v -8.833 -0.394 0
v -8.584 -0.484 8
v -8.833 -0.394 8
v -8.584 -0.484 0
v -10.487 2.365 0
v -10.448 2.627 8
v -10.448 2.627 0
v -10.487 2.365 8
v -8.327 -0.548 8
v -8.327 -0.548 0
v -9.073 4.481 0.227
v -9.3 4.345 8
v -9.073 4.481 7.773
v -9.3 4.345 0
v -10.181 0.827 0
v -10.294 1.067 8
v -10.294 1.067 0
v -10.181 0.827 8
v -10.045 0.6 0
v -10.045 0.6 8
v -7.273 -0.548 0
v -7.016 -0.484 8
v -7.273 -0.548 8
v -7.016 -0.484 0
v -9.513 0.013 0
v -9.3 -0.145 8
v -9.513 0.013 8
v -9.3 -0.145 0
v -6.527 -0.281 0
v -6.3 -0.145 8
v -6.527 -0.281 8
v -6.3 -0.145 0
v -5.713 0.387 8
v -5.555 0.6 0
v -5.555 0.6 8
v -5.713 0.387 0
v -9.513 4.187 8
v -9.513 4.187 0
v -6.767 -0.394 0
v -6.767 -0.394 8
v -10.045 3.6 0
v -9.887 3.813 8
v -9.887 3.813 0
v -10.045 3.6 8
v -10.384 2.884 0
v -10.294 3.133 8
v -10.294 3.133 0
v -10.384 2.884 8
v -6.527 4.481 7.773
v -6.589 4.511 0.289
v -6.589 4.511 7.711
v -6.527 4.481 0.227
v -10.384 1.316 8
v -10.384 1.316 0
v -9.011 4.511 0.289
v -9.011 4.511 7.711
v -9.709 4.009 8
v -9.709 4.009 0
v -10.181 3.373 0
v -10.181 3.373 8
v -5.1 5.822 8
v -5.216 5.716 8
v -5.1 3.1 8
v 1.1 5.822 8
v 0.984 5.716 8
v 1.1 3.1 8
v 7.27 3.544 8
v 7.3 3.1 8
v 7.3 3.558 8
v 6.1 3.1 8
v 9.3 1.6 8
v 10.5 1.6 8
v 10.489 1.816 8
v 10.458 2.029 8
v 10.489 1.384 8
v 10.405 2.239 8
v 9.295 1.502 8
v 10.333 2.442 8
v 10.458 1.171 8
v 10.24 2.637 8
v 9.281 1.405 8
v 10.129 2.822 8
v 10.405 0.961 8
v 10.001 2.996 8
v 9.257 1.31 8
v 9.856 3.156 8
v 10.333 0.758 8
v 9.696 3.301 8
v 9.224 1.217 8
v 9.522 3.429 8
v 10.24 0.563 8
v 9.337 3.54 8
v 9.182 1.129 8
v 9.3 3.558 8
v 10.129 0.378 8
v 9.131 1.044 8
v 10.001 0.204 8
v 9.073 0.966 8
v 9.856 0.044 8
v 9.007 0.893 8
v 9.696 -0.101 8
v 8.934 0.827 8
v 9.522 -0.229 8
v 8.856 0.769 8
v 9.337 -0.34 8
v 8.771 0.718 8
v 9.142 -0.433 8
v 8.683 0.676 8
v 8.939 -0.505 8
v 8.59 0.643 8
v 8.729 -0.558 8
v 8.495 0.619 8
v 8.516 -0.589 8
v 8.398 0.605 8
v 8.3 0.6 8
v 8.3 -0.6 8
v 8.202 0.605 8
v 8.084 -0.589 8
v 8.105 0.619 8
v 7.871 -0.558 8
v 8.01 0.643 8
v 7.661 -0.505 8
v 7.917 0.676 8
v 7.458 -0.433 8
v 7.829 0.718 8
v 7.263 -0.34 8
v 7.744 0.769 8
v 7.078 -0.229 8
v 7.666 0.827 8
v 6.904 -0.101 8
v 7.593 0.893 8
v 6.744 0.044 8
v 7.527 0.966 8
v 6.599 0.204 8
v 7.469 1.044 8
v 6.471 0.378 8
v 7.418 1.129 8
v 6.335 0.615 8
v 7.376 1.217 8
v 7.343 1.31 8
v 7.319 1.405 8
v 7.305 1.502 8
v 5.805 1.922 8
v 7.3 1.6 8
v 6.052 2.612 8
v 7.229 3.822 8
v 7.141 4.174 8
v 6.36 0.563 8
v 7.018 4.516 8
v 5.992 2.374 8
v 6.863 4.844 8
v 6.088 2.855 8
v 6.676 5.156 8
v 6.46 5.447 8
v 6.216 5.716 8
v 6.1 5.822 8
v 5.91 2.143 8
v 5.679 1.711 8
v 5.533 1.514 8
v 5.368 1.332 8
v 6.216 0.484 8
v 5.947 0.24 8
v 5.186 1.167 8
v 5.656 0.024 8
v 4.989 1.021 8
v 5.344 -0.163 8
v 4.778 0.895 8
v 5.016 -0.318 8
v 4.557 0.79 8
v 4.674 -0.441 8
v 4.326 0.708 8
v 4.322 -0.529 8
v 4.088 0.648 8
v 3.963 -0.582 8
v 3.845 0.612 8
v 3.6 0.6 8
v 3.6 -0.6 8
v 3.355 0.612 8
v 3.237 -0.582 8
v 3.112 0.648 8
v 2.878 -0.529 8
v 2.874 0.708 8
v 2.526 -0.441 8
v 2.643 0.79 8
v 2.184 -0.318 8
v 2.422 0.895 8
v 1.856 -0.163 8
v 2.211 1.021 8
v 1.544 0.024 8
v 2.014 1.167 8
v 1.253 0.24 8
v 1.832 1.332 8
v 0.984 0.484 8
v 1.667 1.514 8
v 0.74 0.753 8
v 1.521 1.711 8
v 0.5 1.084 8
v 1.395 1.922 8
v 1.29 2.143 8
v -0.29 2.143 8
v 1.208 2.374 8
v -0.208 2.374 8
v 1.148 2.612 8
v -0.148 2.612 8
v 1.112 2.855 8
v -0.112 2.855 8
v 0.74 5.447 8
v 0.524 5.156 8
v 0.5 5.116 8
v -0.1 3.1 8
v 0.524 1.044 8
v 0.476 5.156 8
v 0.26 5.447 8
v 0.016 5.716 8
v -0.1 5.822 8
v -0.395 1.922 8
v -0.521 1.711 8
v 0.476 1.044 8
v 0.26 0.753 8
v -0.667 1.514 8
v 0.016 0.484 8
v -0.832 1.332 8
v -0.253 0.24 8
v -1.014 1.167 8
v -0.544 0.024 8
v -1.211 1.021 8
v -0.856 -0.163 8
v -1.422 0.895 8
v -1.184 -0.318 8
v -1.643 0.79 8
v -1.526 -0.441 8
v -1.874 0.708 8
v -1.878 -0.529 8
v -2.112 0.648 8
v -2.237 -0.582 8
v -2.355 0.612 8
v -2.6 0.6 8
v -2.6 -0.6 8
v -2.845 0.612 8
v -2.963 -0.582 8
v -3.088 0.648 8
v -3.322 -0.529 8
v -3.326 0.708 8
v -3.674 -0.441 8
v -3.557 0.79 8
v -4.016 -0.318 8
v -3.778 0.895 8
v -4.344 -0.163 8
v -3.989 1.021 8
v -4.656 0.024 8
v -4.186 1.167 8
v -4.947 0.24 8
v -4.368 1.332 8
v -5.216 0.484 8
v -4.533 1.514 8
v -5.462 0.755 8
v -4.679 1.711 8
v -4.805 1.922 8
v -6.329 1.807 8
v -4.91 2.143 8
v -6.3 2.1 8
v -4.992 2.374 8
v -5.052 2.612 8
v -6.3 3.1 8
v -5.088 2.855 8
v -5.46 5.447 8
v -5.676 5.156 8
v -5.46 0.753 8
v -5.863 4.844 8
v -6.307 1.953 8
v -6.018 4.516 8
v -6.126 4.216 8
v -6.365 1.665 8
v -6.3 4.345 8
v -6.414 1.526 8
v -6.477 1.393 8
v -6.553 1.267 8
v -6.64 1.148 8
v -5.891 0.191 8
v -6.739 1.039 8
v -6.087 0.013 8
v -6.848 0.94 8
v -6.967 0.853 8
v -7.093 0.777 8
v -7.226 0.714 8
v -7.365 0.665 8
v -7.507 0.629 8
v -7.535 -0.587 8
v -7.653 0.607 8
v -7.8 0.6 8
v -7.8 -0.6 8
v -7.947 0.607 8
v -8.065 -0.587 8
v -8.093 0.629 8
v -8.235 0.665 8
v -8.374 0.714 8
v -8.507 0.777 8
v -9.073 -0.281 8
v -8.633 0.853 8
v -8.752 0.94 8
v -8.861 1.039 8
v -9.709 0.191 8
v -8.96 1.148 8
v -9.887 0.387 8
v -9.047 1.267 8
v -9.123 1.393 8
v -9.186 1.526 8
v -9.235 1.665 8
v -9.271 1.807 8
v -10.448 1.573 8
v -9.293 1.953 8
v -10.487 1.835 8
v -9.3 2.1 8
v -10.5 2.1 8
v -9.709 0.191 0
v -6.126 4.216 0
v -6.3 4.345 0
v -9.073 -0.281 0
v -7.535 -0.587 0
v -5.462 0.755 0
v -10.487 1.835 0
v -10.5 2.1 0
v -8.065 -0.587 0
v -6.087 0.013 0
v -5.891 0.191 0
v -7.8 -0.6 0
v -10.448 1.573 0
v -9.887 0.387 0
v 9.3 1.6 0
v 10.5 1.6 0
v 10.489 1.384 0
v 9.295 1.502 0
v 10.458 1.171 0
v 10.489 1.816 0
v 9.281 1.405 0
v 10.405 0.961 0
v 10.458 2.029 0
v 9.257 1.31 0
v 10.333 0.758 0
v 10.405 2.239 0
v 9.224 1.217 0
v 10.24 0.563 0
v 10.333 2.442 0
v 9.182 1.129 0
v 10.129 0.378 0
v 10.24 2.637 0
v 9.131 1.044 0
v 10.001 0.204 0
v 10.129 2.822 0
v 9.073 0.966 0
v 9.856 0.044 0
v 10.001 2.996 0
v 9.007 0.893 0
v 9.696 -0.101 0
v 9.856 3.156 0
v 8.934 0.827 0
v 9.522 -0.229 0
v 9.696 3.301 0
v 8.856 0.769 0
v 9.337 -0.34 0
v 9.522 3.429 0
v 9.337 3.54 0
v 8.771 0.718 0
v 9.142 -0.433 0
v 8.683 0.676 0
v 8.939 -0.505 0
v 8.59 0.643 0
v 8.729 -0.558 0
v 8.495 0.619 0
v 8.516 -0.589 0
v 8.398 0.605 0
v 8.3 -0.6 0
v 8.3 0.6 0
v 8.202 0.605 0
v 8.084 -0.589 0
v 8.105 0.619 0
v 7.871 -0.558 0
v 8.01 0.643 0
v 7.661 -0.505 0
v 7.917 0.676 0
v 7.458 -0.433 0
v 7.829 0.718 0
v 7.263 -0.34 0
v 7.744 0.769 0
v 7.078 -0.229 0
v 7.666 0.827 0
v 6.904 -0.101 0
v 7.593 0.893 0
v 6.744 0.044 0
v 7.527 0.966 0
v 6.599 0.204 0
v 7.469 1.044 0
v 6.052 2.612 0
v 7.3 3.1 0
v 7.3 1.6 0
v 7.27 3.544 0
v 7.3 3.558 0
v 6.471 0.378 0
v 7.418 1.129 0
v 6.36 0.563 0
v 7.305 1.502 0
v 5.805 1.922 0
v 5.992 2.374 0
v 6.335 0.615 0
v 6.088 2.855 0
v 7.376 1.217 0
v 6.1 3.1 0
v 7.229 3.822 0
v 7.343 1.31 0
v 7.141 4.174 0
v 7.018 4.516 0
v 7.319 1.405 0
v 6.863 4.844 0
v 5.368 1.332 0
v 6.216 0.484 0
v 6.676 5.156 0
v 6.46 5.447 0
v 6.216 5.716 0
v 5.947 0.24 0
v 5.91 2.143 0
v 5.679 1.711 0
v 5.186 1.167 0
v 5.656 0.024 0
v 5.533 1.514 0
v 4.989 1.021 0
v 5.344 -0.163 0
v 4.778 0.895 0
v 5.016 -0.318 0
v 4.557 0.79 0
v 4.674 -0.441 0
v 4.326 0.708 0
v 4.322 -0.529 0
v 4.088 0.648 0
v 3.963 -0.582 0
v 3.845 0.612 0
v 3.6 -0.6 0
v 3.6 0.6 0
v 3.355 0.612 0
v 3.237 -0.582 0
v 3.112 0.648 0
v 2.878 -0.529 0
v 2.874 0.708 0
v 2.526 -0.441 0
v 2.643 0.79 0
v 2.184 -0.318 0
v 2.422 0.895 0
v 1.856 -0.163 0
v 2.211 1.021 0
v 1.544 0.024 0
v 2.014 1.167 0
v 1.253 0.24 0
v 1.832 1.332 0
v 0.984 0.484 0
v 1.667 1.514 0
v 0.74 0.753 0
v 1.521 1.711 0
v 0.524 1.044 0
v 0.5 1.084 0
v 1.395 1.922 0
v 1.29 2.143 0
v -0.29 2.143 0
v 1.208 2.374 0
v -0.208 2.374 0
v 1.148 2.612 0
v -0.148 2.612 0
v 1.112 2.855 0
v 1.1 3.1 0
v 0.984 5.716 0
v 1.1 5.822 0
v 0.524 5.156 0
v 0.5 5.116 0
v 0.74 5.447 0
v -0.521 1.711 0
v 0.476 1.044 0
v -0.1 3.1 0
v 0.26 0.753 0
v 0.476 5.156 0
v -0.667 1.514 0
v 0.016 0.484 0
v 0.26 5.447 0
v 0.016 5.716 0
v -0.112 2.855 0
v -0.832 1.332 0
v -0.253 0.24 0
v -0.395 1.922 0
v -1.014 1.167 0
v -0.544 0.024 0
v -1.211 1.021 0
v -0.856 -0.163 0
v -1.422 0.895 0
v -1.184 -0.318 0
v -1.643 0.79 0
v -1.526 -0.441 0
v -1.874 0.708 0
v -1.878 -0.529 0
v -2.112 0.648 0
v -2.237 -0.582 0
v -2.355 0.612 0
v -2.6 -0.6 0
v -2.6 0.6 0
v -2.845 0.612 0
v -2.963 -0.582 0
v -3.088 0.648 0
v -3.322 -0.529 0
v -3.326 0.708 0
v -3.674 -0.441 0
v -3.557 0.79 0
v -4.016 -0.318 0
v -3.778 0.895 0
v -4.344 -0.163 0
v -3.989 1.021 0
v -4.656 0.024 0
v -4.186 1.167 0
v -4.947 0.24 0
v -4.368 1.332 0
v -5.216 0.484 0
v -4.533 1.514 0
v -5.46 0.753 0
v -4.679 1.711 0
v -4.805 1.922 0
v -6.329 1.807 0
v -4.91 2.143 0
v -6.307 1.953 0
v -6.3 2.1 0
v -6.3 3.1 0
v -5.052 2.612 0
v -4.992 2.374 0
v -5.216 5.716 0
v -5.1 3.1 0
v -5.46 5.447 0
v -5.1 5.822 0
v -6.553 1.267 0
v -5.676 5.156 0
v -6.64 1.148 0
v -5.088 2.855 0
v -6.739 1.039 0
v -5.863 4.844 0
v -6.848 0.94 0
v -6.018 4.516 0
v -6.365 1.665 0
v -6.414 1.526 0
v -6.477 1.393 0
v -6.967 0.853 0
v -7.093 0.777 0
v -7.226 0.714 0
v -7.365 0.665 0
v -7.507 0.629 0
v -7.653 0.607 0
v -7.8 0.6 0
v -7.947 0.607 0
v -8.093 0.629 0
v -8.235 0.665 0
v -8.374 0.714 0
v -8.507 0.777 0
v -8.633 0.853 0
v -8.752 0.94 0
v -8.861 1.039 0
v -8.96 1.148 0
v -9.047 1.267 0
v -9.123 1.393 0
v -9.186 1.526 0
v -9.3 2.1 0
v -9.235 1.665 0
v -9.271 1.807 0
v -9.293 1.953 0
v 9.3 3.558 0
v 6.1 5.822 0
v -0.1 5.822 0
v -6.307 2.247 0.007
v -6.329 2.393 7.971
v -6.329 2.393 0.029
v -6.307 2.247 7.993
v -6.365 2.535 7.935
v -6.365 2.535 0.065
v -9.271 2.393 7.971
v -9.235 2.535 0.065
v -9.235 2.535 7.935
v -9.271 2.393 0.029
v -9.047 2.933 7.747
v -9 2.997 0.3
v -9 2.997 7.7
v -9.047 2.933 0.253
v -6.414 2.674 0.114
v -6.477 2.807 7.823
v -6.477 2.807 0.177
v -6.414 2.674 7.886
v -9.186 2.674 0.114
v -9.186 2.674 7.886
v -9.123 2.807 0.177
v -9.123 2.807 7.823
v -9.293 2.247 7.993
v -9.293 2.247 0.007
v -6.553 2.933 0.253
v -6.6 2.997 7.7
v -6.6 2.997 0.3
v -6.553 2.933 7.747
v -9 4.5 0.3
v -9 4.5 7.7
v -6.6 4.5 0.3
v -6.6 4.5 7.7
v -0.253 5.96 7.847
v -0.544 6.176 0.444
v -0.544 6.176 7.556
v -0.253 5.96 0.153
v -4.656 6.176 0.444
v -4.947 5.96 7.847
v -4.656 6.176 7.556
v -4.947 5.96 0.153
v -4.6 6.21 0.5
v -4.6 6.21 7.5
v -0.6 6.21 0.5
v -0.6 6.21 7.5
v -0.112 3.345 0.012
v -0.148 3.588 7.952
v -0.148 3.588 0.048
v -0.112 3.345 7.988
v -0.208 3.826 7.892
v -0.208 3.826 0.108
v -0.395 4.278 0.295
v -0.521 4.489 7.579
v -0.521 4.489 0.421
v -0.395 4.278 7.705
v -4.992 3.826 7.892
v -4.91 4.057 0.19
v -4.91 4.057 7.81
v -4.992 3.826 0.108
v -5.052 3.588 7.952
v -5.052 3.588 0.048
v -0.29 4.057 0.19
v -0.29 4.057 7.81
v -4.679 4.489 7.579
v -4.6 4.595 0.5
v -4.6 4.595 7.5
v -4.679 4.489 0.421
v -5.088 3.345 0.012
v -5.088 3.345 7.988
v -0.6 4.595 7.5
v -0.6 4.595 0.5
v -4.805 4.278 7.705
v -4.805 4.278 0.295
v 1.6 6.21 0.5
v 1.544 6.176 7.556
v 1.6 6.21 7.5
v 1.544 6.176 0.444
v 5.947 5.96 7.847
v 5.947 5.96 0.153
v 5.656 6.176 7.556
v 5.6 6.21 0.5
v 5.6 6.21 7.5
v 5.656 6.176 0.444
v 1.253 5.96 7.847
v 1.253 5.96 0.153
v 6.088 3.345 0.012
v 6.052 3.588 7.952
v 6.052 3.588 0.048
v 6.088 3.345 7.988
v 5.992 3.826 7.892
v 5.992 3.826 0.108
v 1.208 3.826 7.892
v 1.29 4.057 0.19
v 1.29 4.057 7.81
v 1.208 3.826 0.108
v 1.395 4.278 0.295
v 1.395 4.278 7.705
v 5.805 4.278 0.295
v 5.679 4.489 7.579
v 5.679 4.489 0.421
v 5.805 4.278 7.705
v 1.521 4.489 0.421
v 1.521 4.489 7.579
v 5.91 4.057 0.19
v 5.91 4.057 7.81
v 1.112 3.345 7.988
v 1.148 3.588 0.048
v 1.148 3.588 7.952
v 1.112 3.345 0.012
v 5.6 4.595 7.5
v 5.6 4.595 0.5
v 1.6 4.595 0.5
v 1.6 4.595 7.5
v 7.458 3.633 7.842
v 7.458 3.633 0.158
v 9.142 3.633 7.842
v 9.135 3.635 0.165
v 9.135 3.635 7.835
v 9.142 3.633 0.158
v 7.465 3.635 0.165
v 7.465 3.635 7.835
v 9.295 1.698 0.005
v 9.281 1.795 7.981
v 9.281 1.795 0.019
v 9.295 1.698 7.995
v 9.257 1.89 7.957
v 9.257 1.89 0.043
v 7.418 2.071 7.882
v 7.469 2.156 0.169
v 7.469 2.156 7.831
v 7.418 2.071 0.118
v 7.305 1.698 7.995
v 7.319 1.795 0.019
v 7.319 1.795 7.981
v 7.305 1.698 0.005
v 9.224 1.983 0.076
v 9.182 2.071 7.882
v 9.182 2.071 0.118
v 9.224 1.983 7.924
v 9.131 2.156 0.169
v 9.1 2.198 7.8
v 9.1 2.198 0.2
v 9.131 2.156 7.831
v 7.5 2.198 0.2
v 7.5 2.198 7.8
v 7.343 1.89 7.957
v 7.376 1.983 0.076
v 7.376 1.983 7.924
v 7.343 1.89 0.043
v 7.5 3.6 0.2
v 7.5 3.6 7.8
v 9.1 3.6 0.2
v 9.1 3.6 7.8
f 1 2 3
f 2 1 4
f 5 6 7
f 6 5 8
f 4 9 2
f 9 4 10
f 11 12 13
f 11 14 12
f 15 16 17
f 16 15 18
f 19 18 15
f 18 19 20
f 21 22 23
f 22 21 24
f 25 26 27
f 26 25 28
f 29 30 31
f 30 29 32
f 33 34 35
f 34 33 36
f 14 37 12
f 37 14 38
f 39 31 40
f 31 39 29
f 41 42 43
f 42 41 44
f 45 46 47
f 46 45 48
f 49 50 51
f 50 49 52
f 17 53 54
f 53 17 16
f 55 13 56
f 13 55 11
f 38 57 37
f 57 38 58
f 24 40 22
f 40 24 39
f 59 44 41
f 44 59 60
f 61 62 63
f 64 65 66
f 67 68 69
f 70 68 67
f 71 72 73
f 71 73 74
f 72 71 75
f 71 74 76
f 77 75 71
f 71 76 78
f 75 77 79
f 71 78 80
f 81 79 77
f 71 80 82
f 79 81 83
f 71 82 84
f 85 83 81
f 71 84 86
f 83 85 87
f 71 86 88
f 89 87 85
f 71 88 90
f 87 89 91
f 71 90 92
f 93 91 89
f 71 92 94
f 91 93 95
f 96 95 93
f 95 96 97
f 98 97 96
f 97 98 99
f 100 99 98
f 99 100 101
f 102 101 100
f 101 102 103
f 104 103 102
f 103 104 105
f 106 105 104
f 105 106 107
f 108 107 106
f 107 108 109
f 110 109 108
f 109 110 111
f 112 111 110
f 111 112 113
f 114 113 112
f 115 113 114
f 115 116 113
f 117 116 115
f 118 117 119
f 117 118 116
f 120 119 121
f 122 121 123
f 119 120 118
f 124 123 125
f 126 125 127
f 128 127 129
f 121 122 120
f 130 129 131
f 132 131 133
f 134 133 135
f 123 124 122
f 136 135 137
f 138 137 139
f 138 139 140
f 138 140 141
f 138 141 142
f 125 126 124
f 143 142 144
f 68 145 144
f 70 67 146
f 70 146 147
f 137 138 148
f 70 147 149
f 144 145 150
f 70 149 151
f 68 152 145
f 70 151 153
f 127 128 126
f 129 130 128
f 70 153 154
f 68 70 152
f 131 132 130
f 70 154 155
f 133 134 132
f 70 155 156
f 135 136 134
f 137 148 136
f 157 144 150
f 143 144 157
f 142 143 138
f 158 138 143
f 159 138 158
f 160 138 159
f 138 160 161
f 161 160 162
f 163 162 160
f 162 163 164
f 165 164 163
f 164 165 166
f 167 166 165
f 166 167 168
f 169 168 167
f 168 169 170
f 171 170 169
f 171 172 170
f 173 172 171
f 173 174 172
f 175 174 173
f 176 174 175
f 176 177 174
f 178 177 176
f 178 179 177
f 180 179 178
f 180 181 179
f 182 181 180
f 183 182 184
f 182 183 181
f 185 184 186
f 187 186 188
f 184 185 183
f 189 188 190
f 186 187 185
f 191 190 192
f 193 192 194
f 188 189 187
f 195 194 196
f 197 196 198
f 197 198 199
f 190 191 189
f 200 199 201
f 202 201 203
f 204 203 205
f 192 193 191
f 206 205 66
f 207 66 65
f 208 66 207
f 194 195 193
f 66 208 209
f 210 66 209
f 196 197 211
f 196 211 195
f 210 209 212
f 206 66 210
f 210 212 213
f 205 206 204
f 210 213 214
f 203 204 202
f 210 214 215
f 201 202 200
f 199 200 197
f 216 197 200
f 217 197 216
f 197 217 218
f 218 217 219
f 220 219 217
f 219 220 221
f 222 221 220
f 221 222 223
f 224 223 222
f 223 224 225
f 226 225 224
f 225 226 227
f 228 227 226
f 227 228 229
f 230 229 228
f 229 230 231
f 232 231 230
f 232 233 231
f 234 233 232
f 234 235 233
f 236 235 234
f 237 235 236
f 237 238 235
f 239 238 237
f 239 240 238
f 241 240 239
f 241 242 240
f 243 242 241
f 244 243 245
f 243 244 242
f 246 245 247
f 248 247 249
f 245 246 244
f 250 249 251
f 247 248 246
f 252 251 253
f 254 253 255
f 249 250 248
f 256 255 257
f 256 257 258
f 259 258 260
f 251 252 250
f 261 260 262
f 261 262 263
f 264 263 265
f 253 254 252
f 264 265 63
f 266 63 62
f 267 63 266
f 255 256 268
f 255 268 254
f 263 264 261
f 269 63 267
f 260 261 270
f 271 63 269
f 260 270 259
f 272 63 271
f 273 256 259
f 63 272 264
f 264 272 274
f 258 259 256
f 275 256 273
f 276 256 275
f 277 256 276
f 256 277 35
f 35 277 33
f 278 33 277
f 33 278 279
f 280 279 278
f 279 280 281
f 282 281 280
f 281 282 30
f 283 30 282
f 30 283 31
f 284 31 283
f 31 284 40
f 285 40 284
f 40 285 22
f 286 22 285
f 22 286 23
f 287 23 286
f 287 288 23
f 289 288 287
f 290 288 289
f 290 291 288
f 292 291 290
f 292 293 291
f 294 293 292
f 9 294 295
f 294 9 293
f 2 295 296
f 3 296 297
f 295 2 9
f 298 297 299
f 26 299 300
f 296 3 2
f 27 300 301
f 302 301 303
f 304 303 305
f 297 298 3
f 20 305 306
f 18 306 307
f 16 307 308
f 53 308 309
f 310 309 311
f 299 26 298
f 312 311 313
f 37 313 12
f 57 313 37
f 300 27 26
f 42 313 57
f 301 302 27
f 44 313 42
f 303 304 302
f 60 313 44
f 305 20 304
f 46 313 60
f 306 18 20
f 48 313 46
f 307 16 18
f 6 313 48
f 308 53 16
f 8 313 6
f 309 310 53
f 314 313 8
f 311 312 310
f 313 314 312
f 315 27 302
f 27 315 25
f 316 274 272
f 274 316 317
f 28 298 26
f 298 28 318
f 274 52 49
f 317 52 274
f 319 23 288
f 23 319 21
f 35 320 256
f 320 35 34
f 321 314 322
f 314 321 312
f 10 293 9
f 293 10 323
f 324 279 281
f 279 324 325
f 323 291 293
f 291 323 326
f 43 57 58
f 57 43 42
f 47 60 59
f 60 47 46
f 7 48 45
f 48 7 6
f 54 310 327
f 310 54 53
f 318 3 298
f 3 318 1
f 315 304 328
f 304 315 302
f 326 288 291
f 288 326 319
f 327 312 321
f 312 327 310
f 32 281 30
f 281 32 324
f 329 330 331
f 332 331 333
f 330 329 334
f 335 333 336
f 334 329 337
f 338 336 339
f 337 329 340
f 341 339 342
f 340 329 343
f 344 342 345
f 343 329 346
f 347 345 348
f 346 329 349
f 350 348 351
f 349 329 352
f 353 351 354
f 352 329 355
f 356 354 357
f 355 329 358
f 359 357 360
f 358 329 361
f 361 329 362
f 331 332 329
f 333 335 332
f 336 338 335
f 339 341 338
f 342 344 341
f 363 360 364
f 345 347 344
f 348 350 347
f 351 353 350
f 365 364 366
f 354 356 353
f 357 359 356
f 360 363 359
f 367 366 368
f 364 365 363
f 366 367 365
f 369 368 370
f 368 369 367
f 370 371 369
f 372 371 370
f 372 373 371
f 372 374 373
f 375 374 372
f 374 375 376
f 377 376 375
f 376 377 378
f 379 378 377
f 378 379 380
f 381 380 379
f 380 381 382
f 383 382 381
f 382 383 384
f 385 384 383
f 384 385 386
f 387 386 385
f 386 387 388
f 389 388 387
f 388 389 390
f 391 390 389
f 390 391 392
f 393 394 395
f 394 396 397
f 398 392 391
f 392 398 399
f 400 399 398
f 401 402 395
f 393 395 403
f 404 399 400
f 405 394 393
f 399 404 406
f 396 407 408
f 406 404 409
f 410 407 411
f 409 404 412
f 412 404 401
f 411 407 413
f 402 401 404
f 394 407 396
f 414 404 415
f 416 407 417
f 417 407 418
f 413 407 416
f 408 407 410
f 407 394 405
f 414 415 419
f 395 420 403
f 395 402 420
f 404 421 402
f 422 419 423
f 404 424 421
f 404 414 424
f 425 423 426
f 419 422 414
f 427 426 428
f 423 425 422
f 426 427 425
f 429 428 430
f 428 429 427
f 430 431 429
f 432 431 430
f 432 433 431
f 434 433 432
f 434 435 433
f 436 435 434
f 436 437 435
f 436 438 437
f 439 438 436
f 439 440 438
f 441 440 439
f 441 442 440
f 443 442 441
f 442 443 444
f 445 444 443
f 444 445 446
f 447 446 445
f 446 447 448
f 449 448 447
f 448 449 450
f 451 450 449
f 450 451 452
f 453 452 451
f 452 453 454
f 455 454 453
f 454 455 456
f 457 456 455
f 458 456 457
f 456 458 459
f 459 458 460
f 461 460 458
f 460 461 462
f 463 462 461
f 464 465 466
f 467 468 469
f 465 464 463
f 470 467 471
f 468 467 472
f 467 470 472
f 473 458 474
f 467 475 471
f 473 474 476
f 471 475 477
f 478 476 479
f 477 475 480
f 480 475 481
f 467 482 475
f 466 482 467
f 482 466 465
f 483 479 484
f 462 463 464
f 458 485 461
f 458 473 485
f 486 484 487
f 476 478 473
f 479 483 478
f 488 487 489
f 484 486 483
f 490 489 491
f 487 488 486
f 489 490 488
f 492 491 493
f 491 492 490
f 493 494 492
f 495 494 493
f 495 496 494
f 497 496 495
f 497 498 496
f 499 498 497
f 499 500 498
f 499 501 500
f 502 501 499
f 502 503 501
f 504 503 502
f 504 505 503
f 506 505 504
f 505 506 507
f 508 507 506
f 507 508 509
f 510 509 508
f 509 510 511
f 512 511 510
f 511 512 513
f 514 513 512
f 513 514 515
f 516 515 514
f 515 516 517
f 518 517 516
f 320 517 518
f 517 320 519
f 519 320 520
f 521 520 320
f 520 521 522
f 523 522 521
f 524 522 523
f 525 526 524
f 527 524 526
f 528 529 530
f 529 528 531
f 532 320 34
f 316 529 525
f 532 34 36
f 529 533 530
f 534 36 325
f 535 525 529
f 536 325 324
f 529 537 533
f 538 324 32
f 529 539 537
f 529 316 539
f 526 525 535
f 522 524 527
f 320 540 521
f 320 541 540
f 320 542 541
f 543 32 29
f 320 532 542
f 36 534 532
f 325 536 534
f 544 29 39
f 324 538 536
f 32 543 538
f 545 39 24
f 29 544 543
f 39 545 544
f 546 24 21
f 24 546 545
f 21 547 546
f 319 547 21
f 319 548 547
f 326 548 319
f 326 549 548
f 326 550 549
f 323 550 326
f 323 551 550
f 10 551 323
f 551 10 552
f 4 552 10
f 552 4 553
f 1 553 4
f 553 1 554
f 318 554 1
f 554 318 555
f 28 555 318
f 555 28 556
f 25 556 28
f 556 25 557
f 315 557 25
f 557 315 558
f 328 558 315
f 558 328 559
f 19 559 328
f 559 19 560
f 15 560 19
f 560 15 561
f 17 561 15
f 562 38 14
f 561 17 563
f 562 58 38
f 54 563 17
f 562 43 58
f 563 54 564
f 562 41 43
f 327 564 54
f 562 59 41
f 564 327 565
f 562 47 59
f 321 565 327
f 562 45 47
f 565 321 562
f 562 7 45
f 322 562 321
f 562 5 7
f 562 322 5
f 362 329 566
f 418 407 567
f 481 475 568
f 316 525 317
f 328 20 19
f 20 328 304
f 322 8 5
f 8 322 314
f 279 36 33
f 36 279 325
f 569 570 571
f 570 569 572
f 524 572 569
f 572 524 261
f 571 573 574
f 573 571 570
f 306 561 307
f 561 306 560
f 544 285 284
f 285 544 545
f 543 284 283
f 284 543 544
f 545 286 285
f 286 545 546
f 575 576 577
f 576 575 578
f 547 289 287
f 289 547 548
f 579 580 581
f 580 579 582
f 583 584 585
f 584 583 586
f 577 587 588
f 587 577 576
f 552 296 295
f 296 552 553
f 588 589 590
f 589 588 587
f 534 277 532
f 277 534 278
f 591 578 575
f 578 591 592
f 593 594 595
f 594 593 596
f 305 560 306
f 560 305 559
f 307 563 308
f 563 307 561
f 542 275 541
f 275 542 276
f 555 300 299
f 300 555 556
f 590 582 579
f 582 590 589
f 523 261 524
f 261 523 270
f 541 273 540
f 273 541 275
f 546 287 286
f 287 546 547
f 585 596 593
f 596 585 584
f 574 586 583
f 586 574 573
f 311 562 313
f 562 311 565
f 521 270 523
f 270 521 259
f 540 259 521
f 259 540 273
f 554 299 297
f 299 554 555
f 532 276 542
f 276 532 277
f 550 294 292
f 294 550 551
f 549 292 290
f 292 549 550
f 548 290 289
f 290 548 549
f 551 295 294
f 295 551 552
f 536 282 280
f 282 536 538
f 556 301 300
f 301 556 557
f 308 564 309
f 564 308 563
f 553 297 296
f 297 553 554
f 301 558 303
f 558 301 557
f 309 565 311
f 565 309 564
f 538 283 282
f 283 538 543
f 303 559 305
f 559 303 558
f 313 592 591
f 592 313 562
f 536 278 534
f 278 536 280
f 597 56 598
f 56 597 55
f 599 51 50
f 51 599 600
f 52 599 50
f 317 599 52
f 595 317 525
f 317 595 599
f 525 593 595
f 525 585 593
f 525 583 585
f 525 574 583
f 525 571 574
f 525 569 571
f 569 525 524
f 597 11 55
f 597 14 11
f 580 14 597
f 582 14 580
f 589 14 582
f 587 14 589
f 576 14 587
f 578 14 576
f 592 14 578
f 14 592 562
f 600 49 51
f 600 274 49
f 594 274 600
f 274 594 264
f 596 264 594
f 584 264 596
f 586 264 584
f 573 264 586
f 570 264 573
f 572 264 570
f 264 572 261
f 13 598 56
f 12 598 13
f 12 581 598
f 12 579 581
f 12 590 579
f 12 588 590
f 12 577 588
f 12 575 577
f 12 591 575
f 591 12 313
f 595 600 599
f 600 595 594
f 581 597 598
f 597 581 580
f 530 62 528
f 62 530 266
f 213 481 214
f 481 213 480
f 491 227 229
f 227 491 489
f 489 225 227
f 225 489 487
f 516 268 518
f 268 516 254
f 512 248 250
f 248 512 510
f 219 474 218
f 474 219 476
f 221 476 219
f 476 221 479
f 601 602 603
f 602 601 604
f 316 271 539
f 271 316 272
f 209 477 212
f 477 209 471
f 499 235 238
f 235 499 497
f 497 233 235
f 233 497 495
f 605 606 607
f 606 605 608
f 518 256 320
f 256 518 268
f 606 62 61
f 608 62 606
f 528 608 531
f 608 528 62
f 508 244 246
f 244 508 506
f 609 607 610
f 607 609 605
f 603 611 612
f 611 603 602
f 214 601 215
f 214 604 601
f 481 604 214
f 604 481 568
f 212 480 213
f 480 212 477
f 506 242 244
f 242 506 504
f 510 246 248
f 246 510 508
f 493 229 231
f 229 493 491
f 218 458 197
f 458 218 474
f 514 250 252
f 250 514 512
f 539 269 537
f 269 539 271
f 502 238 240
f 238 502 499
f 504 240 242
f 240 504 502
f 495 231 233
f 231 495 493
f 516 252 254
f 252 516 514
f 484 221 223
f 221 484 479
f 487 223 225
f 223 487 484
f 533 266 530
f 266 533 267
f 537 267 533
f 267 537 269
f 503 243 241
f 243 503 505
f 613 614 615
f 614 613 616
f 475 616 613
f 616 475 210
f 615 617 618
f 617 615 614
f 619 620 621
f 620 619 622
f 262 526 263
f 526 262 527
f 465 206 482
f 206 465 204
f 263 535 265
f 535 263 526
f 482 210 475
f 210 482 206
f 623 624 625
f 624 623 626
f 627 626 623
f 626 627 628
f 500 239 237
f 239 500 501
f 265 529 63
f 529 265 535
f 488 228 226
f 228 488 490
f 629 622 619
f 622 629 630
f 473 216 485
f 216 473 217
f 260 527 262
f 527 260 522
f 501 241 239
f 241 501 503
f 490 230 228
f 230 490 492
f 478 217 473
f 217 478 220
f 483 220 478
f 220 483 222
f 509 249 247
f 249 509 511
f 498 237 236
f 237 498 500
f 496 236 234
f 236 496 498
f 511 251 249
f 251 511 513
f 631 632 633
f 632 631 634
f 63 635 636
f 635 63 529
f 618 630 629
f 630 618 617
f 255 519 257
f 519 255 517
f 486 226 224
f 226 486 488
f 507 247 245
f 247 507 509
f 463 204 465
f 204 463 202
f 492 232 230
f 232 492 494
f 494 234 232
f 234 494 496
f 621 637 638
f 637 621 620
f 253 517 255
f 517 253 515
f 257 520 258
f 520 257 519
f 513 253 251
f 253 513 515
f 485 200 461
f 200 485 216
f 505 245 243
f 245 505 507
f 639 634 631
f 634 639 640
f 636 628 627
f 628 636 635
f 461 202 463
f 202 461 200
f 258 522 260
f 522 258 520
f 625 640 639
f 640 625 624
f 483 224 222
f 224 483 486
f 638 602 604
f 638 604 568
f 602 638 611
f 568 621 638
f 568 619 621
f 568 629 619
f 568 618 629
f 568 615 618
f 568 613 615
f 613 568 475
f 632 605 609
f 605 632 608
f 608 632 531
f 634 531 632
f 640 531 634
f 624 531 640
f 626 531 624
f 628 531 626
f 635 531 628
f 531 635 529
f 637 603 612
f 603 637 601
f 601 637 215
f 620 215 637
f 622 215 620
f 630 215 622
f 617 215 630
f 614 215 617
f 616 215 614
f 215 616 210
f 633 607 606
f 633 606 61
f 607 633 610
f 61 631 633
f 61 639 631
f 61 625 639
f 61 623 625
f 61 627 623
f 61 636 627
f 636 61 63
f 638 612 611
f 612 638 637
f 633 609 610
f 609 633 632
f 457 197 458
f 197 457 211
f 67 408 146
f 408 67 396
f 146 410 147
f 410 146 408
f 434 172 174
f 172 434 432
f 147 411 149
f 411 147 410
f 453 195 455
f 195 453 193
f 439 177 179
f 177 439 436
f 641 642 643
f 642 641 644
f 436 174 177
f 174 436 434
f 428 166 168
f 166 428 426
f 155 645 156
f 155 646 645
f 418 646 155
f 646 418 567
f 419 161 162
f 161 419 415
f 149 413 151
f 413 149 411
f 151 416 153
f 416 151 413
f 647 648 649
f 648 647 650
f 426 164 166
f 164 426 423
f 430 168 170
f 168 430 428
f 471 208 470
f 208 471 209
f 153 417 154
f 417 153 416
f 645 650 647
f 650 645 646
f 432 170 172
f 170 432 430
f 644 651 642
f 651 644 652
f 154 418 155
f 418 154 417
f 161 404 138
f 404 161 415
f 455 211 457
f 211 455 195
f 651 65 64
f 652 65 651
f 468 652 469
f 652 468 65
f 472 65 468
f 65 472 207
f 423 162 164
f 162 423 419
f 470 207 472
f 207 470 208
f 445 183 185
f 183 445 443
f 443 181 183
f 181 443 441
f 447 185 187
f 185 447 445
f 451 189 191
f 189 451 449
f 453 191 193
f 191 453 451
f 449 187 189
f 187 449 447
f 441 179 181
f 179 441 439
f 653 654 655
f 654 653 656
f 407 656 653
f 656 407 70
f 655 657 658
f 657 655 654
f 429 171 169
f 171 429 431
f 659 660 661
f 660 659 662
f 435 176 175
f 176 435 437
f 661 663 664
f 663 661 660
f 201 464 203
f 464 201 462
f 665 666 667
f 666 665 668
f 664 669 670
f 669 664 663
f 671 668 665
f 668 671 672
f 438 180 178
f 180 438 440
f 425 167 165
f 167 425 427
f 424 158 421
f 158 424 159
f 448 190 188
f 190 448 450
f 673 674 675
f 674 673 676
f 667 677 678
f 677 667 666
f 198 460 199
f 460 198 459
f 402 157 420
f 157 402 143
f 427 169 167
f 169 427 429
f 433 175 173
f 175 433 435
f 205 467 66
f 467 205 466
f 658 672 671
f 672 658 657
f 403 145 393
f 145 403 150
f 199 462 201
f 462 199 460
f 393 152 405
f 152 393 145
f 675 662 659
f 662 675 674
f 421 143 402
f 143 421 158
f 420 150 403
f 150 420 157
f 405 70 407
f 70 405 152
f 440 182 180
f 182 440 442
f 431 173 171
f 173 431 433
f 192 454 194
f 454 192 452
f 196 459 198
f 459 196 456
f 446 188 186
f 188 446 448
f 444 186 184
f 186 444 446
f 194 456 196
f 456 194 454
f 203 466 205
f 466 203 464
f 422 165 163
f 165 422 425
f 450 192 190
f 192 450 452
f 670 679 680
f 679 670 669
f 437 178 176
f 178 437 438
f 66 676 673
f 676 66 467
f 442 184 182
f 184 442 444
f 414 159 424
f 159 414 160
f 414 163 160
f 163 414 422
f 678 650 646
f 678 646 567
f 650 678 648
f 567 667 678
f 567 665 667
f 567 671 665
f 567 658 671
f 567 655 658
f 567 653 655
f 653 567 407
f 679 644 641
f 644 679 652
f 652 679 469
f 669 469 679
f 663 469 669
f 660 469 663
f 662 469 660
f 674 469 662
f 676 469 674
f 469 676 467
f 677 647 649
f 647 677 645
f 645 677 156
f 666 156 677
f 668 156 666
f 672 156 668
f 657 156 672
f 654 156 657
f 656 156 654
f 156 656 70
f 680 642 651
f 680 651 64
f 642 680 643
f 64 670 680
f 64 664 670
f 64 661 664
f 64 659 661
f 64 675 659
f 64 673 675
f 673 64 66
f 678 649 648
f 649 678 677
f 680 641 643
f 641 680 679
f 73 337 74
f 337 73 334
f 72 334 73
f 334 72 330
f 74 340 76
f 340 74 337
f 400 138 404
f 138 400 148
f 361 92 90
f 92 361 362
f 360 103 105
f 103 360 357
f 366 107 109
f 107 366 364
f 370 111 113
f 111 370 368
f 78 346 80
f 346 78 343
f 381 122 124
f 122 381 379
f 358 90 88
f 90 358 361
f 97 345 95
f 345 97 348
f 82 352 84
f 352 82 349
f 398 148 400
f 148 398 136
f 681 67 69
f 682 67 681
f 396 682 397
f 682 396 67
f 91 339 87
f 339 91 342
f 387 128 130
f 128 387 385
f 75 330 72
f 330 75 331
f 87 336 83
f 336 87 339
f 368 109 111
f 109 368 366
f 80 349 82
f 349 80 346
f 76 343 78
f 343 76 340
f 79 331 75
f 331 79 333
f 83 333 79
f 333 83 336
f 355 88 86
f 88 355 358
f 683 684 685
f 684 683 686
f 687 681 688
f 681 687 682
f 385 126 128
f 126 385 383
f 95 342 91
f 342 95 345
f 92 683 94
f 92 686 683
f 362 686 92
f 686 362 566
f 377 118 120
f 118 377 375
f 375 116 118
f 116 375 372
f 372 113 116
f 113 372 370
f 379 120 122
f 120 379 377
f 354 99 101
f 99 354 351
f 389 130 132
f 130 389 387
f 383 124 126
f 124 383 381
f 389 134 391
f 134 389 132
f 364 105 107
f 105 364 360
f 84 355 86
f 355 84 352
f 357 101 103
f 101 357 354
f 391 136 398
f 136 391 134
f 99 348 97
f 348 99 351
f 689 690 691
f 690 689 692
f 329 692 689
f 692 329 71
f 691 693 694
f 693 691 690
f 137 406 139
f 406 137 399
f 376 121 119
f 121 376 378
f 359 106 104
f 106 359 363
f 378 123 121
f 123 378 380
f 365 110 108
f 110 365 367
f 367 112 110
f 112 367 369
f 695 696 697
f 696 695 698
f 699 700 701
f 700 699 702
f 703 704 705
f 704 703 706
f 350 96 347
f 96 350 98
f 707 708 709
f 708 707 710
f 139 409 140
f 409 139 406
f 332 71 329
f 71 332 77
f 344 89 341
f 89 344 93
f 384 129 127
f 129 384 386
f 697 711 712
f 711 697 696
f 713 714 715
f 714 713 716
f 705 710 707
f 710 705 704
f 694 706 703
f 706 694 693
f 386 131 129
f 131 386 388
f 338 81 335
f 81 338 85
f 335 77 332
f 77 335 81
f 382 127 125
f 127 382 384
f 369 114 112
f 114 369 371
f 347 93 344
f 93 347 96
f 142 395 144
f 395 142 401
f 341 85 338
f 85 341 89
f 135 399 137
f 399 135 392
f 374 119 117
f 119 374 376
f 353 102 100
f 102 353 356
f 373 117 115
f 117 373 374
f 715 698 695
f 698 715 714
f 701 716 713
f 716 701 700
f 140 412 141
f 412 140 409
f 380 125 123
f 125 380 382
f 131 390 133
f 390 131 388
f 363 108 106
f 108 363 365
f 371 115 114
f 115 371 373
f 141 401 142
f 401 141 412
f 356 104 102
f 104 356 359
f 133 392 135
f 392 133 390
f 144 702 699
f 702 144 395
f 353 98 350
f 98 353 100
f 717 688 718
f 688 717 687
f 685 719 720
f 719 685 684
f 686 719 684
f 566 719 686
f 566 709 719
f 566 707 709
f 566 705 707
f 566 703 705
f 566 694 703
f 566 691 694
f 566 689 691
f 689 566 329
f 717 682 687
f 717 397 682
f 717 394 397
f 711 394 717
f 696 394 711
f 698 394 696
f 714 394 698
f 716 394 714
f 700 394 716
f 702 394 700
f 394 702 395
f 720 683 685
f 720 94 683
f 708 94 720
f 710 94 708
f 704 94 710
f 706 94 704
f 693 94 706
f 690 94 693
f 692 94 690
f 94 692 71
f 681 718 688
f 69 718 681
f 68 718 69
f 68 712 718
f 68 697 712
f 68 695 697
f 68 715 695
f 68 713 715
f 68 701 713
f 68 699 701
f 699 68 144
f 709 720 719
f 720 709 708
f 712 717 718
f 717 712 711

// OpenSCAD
include <../utp-cable-organizer.scad>

// Example A3: Non-uniform length, non-flat_[back|front] cable holder
settings_cables_dia = [[3,5,5,2]];
settings_uniform_width = false;
settings_flat_back = false;
settings_flat_front = false;
